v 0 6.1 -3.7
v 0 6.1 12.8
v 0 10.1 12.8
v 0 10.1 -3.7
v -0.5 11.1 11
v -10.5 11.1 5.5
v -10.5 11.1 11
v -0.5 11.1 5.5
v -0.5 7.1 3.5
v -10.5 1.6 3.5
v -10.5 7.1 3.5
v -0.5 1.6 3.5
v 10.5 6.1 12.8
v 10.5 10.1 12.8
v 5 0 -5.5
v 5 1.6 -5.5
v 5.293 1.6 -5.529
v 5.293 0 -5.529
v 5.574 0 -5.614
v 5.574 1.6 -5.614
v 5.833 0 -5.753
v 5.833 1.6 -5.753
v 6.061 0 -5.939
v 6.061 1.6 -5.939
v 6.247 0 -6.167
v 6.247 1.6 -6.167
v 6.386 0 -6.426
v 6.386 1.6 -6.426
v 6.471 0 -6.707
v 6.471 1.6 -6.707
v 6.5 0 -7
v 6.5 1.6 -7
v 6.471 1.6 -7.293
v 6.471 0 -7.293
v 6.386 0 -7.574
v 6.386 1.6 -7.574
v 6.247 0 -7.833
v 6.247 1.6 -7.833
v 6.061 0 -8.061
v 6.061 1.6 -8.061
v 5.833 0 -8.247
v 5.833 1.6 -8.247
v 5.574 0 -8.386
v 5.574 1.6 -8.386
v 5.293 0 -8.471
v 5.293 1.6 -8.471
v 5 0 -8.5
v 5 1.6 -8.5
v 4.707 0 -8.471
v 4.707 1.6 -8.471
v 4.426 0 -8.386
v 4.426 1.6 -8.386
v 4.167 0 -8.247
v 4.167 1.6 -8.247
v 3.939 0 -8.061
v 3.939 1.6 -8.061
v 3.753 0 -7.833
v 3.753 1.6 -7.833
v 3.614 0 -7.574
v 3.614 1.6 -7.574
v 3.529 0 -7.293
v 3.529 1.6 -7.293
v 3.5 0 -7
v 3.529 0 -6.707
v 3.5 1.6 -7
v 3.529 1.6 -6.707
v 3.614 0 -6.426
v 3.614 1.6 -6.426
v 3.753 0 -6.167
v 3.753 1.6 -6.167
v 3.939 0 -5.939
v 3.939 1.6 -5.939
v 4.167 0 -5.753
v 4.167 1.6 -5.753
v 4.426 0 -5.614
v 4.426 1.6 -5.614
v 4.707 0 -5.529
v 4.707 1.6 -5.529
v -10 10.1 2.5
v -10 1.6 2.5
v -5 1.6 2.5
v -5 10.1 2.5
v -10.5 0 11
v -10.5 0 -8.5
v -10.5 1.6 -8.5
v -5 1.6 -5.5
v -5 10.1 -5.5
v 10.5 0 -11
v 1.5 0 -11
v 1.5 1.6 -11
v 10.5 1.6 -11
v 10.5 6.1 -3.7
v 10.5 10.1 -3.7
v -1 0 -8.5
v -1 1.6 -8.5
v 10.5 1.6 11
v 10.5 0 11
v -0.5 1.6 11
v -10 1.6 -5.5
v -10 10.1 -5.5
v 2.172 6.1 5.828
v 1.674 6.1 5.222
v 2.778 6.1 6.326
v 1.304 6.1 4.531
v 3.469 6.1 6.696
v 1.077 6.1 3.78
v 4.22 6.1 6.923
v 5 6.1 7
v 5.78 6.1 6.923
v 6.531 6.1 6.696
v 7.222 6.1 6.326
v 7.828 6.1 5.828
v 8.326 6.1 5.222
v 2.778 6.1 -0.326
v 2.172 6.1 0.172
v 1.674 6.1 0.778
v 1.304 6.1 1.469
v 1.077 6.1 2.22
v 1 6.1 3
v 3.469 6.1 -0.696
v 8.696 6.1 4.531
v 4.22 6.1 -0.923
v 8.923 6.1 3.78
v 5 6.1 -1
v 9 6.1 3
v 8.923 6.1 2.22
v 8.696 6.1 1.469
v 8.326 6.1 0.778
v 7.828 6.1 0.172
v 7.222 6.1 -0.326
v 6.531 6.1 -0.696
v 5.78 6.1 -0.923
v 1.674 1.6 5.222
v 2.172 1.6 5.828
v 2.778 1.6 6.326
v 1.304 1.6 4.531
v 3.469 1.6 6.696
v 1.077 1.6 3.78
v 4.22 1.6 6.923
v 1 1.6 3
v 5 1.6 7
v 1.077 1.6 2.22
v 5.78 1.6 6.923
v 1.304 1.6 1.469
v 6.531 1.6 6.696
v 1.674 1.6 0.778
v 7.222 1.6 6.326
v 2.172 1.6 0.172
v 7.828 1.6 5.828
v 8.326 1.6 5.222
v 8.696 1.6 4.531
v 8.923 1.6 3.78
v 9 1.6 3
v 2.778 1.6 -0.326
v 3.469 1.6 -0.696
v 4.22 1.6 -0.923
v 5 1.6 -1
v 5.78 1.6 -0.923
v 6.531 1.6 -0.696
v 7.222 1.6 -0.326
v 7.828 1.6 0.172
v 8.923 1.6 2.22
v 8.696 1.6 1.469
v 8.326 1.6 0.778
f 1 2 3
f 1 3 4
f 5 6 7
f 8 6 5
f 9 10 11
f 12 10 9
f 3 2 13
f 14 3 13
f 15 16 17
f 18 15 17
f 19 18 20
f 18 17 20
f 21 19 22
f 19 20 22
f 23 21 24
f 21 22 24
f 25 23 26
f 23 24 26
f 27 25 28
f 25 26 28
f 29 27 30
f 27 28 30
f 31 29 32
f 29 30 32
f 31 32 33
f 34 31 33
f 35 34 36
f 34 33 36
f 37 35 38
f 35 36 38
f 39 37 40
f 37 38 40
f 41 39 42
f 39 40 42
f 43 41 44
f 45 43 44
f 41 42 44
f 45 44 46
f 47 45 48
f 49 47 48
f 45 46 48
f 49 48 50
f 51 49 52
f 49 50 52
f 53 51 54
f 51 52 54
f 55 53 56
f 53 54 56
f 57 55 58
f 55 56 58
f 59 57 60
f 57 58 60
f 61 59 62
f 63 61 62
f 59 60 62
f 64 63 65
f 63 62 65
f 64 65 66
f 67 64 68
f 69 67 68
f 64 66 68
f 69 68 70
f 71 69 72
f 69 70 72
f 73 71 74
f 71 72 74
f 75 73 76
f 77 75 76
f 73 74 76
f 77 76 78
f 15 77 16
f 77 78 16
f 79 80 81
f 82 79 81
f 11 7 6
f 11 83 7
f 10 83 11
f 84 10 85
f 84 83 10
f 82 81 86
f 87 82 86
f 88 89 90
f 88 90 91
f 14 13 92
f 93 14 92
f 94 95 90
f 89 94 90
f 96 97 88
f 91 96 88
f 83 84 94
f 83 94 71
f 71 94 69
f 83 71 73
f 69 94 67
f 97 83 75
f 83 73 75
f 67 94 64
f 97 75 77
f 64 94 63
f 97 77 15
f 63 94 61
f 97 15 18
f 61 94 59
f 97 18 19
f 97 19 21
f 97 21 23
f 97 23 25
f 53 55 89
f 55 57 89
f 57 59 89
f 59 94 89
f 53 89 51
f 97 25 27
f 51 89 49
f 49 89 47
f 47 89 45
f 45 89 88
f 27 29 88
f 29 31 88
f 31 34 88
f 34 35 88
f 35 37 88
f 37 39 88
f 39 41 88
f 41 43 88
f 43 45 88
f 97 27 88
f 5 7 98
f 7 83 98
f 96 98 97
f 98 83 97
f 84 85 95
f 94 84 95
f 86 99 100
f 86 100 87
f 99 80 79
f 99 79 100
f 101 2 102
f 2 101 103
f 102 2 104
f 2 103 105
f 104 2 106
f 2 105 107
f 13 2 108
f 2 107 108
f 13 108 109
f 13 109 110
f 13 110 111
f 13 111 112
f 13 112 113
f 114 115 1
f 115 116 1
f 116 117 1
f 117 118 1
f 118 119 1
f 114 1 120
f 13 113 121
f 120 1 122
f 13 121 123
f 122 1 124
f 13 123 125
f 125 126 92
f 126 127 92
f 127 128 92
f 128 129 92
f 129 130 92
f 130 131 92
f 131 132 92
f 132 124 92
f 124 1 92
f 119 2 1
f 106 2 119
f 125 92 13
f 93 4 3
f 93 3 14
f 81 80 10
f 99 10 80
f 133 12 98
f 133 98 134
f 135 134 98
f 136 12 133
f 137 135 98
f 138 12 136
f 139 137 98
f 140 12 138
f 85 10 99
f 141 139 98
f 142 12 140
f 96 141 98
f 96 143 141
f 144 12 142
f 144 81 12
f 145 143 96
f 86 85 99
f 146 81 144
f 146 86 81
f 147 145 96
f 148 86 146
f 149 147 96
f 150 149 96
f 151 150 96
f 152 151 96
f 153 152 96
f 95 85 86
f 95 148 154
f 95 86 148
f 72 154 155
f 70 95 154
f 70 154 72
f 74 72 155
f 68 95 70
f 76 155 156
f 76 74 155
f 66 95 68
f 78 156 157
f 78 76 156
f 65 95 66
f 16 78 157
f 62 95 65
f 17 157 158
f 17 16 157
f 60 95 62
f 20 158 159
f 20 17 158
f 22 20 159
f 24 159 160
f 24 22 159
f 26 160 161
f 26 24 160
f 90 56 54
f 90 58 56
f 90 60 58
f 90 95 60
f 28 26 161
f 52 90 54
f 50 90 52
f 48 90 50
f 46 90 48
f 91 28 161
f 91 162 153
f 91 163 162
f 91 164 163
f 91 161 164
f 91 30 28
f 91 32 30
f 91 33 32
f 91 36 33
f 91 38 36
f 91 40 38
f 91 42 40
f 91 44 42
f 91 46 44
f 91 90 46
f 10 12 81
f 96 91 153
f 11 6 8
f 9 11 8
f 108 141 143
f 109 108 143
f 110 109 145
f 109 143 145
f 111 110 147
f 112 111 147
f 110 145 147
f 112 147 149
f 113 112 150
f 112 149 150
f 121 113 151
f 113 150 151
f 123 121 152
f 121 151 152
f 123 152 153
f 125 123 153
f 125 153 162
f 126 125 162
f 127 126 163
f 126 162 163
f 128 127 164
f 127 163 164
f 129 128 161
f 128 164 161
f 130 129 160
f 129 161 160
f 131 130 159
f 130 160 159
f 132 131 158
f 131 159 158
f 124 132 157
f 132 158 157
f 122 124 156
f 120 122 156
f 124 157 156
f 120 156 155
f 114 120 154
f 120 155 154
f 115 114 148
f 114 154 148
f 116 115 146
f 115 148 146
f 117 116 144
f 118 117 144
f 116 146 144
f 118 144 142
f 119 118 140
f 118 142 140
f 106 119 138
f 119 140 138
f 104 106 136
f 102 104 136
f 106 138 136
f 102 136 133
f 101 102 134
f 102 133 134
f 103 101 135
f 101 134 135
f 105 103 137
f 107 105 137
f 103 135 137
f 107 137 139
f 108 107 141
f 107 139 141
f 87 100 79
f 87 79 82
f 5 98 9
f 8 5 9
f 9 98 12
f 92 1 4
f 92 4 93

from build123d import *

# Parameters (mm, degrees)
SKETCH1_W           = 21
SKETCH1_H           = 22
BOSS_EXTRUDE1_DEPTH = 1.6
SKETCH2_R           = 1.5
CUT_EXTRUDE1_DEPTH  = 1.6
SKETCH3_W           = 5
SKETCH3_H           = 8
BOSS_EXTRUDE2_DEPTH = 8.5
SKETCH4_W           = 10
SKETCH4_H           = 7.5
BOSS_EXTRUDE3_DEPTH = 9.5
CHAMFER1_SIZE       = 4
CHAMFER1_SIZE2      = 2
SKETCH5_R           = 4
BOSS_EXTRUDE4_DEPTH = 4.5
SKETCH6_W           = 10.5
SKETCH6_H           = 16.5
BOSS_EXTRUDE5_DEPTH = 4


with BuildPart() as part:
    # Sketch1 → Boss-Extrude1 (new body)
    with BuildSketch(Plane(origin=(0, 0, 0), x_dir=(1, 0, 0), z_dir=(0, 1, 0))):
        Rectangle(SKETCH1_W, SKETCH1_H)
    extrude(amount=BOSS_EXTRUDE1_DEPTH)

    # Sketch2 → Cut-Extrude1 (cut)
    with BuildSketch(Plane(origin=(0, 1.6, 0), x_dir=(1, 0, 0), z_dir=(0, 1, 0))):
        with Locations(Location((5, 7, 0), (0, 0, 270))):
            Circle(SKETCH2_R)
        Polygon((-12.078029191, 8.5), (-1, 8.5), (1.5, 11), (-12.078029191, 11), align=None)
    extrude(amount=-CUT_EXTRUDE1_DEPTH, mode=Mode.SUBTRACT)

    # Sketch3 → Boss-Extrude2 (add)
    with BuildSketch(Plane(origin=(0, 1.6, 0), x_dir=(1, 0, 0), z_dir=(0, 1, 0))):
        with Locations((-7.5, 1.5)):
            Rectangle(SKETCH3_W, SKETCH3_H)
    extrude(amount=BOSS_EXTRUDE2_DEPTH)

    # Sketch4 → Boss-Extrude3 (add)
    with BuildSketch(Plane(origin=(0, 1.6, 0), x_dir=(1, 0, 0), z_dir=(0, 1, 0))):
        with Locations((-5.5, -7.25)):
            Rectangle(SKETCH4_W, SKETCH4_H)
    extrude(amount=BOSS_EXTRUDE3_DEPTH)

    # Chamfer1
    chamfer1_edges = [part.edges().sort_by_distance(p)[0] for p in [
        (-5.5, 11.1, 3.5),
    ]]
    chamfer1_side = [part.faces().sort_by_distance(p)[0] for p in [
        (-5.5, 6.35, 3.5),
    ]]
    chamfer(chamfer1_edges, length=CHAMFER1_SIZE, length2=CHAMFER1_SIZE2, reference=chamfer1_side[0])

    # Sketch5 → Boss-Extrude4 (add)
    with BuildSketch(Plane(origin=(0, 1.6, 0), x_dir=(1, 0, 0), z_dir=(0, 1, 0))):
        with Locations(Location((5, -3, 0), (0, 0, 270))):
            Circle(SKETCH5_R)
    extrude(amount=BOSS_EXTRUDE4_DEPTH)

    # Sketch6 → Boss-Extrude5 (add)
    with BuildSketch(Plane(origin=(0, 6.1, 0), x_dir=(1, 0, 0), z_dir=(0, 1, 0))):
        with Locations((5.25, -4.55)):
            Rectangle(SKETCH6_W, SKETCH6_H)
    extrude(amount=BOSS_EXTRUDE5_DEPTH)


solid = part.part
